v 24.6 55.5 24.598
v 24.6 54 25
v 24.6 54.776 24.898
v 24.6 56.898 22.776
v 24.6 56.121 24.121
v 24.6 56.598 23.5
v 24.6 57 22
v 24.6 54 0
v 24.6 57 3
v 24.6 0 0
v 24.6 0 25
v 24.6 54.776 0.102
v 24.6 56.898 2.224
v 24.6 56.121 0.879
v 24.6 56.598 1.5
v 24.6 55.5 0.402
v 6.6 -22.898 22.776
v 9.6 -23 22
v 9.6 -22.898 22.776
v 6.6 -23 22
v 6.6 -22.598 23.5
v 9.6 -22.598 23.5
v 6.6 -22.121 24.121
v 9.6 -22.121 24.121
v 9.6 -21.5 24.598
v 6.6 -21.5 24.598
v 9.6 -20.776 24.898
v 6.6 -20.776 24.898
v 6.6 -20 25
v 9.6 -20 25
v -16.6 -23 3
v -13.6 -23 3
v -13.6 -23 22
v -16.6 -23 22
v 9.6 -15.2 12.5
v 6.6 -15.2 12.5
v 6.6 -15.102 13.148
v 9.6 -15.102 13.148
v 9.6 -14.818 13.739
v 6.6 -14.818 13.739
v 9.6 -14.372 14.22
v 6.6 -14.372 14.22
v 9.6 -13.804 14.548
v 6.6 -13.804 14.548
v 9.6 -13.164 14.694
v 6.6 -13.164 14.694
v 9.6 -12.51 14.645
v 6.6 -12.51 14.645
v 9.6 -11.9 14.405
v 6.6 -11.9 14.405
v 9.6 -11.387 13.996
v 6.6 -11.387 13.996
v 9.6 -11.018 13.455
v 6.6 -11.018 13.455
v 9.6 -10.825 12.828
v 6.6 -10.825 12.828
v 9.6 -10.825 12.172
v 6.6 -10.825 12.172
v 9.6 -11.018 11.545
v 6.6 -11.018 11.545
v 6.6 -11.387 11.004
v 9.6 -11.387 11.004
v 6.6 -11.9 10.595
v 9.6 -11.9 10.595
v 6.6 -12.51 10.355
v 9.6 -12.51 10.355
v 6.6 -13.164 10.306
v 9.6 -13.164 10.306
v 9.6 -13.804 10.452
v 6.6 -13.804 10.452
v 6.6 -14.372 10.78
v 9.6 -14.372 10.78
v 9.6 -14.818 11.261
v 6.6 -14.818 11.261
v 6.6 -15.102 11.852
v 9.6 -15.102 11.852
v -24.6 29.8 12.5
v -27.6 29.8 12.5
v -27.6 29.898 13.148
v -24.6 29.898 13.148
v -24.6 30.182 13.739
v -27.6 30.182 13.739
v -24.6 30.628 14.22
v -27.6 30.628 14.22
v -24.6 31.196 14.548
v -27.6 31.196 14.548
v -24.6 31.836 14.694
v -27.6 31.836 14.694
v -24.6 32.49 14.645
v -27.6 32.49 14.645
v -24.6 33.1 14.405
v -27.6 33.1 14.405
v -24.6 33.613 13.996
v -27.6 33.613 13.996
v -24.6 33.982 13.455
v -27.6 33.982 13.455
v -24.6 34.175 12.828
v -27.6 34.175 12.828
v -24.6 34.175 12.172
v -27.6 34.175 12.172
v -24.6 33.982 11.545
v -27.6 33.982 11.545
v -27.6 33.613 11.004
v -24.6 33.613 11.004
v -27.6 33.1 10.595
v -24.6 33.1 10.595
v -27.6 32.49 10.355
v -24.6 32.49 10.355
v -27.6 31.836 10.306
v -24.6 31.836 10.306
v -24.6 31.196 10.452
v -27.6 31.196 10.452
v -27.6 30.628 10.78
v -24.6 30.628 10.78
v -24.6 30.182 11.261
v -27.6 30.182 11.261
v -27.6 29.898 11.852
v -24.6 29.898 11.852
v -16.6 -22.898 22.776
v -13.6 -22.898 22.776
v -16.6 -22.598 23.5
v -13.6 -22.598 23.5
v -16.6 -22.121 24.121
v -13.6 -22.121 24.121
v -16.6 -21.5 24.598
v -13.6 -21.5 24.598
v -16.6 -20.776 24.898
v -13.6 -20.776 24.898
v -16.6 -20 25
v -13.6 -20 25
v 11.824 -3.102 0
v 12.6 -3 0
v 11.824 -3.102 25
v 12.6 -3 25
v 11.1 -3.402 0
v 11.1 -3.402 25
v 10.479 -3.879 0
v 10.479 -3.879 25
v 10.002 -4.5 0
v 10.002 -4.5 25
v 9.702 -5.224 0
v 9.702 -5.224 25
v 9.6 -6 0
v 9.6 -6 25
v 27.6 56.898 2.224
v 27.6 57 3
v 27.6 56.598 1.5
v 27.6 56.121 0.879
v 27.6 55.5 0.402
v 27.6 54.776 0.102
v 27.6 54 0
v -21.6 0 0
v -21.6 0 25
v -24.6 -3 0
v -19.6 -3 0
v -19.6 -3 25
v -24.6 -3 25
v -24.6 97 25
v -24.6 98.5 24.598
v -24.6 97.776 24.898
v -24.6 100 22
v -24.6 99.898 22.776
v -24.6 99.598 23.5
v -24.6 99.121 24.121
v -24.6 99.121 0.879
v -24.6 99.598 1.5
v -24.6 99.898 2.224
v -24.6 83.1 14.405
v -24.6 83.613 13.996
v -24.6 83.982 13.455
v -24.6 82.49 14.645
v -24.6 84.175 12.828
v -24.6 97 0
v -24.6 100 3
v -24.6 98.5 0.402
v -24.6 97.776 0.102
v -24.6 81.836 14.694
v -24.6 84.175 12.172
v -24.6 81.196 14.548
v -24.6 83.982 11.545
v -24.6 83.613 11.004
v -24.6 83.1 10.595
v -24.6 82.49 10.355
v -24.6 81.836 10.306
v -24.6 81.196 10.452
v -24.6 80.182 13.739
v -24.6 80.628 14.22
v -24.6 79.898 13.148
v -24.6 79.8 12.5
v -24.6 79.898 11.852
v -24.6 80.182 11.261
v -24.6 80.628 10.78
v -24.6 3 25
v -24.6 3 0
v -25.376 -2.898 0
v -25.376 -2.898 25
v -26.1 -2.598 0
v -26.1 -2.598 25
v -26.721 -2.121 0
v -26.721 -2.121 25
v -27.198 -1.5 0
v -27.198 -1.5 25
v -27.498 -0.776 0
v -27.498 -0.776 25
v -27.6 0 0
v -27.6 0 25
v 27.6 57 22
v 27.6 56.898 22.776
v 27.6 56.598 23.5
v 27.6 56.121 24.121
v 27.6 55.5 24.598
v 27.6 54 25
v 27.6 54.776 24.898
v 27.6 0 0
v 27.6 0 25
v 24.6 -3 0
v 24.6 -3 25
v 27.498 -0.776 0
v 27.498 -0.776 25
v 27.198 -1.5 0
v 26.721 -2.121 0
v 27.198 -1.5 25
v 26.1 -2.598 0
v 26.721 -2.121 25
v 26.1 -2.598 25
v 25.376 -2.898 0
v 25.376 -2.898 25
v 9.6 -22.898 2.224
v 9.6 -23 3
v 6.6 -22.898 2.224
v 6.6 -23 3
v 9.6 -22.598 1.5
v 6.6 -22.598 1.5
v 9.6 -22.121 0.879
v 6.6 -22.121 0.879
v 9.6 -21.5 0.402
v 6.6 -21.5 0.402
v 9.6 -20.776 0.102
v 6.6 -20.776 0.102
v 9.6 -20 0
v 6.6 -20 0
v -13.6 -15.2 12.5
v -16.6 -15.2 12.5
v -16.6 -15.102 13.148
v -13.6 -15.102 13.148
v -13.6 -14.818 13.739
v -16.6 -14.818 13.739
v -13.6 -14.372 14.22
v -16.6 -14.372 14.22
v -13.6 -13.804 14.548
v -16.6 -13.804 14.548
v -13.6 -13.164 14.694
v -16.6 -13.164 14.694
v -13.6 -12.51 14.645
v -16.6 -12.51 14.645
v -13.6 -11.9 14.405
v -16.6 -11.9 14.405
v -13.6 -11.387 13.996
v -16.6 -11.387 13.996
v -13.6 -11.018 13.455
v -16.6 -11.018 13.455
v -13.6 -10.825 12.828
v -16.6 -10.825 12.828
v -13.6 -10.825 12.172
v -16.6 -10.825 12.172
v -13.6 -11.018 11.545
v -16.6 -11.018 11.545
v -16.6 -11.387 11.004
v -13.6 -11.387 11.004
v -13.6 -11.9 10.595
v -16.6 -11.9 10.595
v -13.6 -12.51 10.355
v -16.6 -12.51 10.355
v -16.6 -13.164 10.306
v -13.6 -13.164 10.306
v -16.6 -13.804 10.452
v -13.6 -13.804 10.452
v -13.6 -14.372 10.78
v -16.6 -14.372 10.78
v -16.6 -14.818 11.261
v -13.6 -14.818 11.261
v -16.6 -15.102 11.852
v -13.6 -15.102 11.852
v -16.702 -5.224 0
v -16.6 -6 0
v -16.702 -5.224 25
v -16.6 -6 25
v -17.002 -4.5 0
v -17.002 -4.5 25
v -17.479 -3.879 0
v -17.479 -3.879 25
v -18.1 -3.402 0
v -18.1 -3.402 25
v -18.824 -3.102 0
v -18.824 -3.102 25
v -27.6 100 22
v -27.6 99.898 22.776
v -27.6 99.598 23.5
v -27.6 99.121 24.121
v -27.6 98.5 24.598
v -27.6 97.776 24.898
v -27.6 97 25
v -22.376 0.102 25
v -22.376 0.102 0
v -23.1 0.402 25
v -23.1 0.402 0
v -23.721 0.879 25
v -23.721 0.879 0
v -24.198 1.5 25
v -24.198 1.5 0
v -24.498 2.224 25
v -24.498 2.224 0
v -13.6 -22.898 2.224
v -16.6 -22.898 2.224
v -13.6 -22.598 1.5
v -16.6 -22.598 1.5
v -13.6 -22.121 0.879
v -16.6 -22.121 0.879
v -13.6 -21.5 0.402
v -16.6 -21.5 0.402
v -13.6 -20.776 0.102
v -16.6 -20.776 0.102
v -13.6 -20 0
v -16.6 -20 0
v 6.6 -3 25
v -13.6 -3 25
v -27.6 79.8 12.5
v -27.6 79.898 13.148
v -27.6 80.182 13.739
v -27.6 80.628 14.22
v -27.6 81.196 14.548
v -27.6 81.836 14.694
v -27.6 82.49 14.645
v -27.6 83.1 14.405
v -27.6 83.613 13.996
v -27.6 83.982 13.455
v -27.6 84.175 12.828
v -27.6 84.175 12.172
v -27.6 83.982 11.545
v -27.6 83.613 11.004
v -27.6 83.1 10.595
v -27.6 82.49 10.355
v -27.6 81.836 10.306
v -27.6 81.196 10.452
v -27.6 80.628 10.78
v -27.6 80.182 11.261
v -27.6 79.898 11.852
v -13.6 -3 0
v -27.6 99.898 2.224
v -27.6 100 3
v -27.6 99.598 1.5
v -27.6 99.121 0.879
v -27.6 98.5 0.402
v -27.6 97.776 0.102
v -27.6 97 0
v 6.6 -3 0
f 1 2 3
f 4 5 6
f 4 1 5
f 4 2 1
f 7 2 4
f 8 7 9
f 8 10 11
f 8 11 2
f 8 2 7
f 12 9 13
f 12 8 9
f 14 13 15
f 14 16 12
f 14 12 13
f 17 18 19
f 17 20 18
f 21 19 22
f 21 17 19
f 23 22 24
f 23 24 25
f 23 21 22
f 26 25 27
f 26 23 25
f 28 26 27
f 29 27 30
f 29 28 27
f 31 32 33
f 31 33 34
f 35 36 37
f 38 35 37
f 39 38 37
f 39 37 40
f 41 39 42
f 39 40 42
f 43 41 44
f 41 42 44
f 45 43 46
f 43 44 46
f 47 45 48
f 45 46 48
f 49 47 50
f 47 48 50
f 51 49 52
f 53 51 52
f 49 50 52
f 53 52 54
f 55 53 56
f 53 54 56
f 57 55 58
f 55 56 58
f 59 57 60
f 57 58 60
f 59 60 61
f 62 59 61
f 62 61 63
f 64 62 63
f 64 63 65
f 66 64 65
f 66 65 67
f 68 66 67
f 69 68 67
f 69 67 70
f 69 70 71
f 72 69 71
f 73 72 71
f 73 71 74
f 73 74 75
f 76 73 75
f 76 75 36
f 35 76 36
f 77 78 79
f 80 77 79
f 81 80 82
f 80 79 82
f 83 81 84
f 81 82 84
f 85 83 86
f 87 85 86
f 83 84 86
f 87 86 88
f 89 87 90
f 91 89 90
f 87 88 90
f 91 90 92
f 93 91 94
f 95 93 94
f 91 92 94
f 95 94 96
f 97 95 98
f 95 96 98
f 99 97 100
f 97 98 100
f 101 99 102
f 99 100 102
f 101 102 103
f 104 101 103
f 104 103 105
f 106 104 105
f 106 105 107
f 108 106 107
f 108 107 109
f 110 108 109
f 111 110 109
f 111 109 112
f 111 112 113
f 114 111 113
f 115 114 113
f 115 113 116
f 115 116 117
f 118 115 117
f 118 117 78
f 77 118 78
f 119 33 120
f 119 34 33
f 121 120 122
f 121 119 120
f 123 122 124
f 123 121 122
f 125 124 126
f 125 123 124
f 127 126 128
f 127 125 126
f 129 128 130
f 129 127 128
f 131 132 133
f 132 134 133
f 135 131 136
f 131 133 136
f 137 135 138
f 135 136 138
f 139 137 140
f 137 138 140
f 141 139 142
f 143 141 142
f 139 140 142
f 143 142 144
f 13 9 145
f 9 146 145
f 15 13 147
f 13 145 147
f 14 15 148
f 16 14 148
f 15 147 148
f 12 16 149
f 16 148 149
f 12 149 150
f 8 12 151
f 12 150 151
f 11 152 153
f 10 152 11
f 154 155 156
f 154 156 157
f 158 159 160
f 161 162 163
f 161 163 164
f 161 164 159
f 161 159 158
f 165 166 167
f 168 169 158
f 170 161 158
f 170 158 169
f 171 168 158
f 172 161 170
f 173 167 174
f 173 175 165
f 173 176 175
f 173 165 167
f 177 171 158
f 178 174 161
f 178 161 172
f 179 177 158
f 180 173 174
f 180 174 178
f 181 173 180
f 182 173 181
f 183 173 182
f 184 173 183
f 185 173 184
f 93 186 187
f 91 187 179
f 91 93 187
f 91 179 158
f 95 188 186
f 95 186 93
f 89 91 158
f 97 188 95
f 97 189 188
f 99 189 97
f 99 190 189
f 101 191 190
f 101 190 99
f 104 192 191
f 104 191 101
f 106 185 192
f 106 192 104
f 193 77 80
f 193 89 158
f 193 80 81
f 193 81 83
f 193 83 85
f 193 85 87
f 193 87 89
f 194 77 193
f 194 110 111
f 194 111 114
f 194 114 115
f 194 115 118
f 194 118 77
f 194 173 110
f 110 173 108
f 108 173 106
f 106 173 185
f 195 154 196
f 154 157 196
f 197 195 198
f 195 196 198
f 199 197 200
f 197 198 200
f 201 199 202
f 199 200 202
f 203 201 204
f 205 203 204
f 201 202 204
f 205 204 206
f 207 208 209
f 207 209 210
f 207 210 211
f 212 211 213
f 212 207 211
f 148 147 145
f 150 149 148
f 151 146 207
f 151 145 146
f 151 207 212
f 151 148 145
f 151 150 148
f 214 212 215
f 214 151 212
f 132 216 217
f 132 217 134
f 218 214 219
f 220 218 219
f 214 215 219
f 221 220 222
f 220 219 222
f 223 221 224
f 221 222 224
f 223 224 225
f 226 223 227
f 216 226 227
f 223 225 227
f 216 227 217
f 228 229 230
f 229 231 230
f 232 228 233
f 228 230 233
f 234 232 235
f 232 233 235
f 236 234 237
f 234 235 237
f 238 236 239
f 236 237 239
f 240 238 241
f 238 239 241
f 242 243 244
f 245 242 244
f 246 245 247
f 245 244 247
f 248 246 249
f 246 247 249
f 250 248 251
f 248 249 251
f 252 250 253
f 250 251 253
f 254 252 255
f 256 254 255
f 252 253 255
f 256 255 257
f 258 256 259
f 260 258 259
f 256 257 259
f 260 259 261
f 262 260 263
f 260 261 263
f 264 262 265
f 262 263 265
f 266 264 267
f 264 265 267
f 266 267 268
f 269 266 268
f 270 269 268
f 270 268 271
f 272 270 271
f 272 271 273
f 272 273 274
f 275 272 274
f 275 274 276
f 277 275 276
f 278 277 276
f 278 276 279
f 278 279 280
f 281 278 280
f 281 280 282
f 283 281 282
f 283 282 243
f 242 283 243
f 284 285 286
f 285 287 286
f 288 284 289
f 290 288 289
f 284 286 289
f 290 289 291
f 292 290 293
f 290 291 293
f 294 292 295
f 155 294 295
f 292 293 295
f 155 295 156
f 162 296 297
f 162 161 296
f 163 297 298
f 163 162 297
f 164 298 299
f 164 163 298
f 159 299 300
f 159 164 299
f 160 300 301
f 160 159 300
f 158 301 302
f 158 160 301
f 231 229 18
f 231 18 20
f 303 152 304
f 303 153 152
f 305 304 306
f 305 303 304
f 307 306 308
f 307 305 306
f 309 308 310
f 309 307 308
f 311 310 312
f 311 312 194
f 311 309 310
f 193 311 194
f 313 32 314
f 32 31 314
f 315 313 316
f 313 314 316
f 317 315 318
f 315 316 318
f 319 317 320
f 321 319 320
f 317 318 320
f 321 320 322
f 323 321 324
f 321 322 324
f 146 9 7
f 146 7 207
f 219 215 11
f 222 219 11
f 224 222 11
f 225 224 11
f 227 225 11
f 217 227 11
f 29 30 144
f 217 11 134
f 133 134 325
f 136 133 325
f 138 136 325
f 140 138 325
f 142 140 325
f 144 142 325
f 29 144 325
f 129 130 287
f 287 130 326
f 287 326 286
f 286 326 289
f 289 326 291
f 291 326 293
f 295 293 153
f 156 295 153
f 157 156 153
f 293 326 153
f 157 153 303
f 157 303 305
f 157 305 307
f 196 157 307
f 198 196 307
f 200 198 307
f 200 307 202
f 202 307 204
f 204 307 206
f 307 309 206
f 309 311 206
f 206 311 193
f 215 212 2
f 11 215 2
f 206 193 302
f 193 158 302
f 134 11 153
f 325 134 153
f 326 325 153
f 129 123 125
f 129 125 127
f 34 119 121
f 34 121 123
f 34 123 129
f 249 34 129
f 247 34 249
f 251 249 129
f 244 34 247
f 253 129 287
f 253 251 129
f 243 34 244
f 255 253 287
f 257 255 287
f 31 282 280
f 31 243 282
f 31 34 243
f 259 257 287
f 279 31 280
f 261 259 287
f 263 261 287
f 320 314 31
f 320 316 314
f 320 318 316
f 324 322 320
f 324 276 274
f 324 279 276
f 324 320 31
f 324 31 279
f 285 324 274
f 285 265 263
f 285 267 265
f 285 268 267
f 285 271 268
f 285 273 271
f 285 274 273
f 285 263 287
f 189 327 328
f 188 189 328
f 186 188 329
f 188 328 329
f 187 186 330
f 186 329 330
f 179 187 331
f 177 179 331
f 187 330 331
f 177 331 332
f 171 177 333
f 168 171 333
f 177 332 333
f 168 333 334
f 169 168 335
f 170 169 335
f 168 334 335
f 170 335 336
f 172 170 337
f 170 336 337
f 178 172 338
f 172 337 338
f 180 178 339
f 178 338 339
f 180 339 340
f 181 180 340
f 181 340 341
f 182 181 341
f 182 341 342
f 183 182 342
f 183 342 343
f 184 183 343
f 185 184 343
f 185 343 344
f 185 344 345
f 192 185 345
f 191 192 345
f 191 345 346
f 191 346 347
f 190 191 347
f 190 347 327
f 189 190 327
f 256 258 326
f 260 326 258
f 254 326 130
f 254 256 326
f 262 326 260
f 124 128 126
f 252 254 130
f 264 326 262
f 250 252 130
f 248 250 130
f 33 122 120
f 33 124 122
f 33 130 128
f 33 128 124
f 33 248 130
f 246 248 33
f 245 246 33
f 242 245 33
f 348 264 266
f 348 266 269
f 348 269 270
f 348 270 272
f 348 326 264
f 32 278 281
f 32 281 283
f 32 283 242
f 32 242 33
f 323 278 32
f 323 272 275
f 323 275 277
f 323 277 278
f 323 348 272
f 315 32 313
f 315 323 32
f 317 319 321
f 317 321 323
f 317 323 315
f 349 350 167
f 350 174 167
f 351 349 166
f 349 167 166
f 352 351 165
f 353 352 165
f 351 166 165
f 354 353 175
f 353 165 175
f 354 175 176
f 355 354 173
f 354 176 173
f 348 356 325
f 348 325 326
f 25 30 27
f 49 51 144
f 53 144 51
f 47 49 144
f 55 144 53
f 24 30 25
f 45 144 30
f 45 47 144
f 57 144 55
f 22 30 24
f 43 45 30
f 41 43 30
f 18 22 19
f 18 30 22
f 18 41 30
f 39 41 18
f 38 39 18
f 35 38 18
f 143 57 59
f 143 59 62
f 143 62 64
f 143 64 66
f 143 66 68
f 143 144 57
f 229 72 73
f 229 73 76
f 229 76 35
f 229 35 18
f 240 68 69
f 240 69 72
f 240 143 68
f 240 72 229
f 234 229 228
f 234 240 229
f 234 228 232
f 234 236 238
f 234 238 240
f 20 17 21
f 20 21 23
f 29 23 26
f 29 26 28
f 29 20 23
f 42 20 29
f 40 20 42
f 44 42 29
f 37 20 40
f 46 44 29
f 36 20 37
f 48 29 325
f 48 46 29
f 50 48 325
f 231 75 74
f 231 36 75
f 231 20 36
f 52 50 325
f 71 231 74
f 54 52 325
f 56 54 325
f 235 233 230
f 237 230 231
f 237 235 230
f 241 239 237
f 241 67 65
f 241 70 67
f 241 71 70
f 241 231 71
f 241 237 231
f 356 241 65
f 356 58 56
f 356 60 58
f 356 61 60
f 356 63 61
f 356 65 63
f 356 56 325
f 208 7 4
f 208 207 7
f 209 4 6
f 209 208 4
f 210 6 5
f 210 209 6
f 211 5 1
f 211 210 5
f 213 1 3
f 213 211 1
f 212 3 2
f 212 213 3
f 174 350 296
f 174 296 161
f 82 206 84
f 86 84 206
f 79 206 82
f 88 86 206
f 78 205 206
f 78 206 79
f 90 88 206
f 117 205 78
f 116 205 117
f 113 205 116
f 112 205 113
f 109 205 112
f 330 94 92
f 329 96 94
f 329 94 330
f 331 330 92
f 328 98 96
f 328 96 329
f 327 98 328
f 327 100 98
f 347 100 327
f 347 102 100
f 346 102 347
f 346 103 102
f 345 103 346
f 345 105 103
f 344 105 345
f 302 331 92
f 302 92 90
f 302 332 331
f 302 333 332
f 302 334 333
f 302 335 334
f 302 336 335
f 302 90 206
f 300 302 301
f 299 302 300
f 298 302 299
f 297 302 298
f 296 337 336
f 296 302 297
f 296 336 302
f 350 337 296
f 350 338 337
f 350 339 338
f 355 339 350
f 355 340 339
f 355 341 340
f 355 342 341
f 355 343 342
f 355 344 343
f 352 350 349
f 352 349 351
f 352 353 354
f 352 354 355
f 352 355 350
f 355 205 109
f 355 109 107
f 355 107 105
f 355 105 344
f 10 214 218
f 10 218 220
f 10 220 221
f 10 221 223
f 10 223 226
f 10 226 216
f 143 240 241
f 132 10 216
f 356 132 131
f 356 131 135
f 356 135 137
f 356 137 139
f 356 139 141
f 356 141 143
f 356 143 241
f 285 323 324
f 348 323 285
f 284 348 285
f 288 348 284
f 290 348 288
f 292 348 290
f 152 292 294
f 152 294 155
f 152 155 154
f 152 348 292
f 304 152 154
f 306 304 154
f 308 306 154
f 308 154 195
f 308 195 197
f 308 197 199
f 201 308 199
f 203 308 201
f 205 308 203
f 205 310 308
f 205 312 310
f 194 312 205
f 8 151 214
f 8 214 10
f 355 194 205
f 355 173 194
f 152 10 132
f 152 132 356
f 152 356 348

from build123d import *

# Parameters (mm, degrees)
BOSS_EXTRUDE1_DEPTH = 25
FILLET1_R           = 3
SKETCH2_R           = 2.2
CUT_EXTRUDE1_DEPTH  = 40


with BuildPart() as part:
    # Sketch1 → Boss-Extrude1 (new body)
    with BuildSketch(Plane.XY):
        Polygon((-24.6, 0), (24.6, 0), (24.6, 57), (27.6, 57), (27.6, -3), (9.6, -3), (9.6, -23), (6.6, -23), (6.6, -3), (-13.6, -3), (-13.6, -23), (-16.6, -23), (-16.6, -3), (-27.6, -3), (-27.6, 100), (-24.6, 100), align=None)
    extrude(amount=BOSS_EXTRUDE1_DEPTH)

    # Fillet1
    fillet1_edges = [part.edges().sort_by_distance(p)[0] for p in [
        (26.1, 57, 0),
        (8.1, -23, 0),
        (-15.1, -23, 0),
        (-15.1, -23, 25),
        (-26.1, 100, 0),
        (-24.6, 0, 12.5),
        (27.6, -3, 12.5),
        (9.6, -3, 12.5),
        (-16.6, -3, 12.5),
        (-27.6, -3, 12.5),
        (8.1, -23, 25),
        (26.1, 57, 25),
        (-26.1, 100, 25),
    ]]
    fillet(fillet1_edges, radius=FILLET1_R)

    # Sketch2 → Cut-Extrude1 (cut)
    with BuildSketch(Plane.ZY.offset(27.6)):
        with Locations(Location((12.5, 82, 0), (0, 0, 270))):
            Circle(SKETCH2_R)
        with Locations(Location((12.5, 32, 0), (0, 0, 270))):
            Circle(SKETCH2_R)
        with Locations(Location((12.5, -13, 0), (0, 0, 270))):
            Circle(SKETCH2_R)
    extrude(amount=-CUT_EXTRUDE1_DEPTH, mode=Mode.SUBTRACT)


solid = part.part
